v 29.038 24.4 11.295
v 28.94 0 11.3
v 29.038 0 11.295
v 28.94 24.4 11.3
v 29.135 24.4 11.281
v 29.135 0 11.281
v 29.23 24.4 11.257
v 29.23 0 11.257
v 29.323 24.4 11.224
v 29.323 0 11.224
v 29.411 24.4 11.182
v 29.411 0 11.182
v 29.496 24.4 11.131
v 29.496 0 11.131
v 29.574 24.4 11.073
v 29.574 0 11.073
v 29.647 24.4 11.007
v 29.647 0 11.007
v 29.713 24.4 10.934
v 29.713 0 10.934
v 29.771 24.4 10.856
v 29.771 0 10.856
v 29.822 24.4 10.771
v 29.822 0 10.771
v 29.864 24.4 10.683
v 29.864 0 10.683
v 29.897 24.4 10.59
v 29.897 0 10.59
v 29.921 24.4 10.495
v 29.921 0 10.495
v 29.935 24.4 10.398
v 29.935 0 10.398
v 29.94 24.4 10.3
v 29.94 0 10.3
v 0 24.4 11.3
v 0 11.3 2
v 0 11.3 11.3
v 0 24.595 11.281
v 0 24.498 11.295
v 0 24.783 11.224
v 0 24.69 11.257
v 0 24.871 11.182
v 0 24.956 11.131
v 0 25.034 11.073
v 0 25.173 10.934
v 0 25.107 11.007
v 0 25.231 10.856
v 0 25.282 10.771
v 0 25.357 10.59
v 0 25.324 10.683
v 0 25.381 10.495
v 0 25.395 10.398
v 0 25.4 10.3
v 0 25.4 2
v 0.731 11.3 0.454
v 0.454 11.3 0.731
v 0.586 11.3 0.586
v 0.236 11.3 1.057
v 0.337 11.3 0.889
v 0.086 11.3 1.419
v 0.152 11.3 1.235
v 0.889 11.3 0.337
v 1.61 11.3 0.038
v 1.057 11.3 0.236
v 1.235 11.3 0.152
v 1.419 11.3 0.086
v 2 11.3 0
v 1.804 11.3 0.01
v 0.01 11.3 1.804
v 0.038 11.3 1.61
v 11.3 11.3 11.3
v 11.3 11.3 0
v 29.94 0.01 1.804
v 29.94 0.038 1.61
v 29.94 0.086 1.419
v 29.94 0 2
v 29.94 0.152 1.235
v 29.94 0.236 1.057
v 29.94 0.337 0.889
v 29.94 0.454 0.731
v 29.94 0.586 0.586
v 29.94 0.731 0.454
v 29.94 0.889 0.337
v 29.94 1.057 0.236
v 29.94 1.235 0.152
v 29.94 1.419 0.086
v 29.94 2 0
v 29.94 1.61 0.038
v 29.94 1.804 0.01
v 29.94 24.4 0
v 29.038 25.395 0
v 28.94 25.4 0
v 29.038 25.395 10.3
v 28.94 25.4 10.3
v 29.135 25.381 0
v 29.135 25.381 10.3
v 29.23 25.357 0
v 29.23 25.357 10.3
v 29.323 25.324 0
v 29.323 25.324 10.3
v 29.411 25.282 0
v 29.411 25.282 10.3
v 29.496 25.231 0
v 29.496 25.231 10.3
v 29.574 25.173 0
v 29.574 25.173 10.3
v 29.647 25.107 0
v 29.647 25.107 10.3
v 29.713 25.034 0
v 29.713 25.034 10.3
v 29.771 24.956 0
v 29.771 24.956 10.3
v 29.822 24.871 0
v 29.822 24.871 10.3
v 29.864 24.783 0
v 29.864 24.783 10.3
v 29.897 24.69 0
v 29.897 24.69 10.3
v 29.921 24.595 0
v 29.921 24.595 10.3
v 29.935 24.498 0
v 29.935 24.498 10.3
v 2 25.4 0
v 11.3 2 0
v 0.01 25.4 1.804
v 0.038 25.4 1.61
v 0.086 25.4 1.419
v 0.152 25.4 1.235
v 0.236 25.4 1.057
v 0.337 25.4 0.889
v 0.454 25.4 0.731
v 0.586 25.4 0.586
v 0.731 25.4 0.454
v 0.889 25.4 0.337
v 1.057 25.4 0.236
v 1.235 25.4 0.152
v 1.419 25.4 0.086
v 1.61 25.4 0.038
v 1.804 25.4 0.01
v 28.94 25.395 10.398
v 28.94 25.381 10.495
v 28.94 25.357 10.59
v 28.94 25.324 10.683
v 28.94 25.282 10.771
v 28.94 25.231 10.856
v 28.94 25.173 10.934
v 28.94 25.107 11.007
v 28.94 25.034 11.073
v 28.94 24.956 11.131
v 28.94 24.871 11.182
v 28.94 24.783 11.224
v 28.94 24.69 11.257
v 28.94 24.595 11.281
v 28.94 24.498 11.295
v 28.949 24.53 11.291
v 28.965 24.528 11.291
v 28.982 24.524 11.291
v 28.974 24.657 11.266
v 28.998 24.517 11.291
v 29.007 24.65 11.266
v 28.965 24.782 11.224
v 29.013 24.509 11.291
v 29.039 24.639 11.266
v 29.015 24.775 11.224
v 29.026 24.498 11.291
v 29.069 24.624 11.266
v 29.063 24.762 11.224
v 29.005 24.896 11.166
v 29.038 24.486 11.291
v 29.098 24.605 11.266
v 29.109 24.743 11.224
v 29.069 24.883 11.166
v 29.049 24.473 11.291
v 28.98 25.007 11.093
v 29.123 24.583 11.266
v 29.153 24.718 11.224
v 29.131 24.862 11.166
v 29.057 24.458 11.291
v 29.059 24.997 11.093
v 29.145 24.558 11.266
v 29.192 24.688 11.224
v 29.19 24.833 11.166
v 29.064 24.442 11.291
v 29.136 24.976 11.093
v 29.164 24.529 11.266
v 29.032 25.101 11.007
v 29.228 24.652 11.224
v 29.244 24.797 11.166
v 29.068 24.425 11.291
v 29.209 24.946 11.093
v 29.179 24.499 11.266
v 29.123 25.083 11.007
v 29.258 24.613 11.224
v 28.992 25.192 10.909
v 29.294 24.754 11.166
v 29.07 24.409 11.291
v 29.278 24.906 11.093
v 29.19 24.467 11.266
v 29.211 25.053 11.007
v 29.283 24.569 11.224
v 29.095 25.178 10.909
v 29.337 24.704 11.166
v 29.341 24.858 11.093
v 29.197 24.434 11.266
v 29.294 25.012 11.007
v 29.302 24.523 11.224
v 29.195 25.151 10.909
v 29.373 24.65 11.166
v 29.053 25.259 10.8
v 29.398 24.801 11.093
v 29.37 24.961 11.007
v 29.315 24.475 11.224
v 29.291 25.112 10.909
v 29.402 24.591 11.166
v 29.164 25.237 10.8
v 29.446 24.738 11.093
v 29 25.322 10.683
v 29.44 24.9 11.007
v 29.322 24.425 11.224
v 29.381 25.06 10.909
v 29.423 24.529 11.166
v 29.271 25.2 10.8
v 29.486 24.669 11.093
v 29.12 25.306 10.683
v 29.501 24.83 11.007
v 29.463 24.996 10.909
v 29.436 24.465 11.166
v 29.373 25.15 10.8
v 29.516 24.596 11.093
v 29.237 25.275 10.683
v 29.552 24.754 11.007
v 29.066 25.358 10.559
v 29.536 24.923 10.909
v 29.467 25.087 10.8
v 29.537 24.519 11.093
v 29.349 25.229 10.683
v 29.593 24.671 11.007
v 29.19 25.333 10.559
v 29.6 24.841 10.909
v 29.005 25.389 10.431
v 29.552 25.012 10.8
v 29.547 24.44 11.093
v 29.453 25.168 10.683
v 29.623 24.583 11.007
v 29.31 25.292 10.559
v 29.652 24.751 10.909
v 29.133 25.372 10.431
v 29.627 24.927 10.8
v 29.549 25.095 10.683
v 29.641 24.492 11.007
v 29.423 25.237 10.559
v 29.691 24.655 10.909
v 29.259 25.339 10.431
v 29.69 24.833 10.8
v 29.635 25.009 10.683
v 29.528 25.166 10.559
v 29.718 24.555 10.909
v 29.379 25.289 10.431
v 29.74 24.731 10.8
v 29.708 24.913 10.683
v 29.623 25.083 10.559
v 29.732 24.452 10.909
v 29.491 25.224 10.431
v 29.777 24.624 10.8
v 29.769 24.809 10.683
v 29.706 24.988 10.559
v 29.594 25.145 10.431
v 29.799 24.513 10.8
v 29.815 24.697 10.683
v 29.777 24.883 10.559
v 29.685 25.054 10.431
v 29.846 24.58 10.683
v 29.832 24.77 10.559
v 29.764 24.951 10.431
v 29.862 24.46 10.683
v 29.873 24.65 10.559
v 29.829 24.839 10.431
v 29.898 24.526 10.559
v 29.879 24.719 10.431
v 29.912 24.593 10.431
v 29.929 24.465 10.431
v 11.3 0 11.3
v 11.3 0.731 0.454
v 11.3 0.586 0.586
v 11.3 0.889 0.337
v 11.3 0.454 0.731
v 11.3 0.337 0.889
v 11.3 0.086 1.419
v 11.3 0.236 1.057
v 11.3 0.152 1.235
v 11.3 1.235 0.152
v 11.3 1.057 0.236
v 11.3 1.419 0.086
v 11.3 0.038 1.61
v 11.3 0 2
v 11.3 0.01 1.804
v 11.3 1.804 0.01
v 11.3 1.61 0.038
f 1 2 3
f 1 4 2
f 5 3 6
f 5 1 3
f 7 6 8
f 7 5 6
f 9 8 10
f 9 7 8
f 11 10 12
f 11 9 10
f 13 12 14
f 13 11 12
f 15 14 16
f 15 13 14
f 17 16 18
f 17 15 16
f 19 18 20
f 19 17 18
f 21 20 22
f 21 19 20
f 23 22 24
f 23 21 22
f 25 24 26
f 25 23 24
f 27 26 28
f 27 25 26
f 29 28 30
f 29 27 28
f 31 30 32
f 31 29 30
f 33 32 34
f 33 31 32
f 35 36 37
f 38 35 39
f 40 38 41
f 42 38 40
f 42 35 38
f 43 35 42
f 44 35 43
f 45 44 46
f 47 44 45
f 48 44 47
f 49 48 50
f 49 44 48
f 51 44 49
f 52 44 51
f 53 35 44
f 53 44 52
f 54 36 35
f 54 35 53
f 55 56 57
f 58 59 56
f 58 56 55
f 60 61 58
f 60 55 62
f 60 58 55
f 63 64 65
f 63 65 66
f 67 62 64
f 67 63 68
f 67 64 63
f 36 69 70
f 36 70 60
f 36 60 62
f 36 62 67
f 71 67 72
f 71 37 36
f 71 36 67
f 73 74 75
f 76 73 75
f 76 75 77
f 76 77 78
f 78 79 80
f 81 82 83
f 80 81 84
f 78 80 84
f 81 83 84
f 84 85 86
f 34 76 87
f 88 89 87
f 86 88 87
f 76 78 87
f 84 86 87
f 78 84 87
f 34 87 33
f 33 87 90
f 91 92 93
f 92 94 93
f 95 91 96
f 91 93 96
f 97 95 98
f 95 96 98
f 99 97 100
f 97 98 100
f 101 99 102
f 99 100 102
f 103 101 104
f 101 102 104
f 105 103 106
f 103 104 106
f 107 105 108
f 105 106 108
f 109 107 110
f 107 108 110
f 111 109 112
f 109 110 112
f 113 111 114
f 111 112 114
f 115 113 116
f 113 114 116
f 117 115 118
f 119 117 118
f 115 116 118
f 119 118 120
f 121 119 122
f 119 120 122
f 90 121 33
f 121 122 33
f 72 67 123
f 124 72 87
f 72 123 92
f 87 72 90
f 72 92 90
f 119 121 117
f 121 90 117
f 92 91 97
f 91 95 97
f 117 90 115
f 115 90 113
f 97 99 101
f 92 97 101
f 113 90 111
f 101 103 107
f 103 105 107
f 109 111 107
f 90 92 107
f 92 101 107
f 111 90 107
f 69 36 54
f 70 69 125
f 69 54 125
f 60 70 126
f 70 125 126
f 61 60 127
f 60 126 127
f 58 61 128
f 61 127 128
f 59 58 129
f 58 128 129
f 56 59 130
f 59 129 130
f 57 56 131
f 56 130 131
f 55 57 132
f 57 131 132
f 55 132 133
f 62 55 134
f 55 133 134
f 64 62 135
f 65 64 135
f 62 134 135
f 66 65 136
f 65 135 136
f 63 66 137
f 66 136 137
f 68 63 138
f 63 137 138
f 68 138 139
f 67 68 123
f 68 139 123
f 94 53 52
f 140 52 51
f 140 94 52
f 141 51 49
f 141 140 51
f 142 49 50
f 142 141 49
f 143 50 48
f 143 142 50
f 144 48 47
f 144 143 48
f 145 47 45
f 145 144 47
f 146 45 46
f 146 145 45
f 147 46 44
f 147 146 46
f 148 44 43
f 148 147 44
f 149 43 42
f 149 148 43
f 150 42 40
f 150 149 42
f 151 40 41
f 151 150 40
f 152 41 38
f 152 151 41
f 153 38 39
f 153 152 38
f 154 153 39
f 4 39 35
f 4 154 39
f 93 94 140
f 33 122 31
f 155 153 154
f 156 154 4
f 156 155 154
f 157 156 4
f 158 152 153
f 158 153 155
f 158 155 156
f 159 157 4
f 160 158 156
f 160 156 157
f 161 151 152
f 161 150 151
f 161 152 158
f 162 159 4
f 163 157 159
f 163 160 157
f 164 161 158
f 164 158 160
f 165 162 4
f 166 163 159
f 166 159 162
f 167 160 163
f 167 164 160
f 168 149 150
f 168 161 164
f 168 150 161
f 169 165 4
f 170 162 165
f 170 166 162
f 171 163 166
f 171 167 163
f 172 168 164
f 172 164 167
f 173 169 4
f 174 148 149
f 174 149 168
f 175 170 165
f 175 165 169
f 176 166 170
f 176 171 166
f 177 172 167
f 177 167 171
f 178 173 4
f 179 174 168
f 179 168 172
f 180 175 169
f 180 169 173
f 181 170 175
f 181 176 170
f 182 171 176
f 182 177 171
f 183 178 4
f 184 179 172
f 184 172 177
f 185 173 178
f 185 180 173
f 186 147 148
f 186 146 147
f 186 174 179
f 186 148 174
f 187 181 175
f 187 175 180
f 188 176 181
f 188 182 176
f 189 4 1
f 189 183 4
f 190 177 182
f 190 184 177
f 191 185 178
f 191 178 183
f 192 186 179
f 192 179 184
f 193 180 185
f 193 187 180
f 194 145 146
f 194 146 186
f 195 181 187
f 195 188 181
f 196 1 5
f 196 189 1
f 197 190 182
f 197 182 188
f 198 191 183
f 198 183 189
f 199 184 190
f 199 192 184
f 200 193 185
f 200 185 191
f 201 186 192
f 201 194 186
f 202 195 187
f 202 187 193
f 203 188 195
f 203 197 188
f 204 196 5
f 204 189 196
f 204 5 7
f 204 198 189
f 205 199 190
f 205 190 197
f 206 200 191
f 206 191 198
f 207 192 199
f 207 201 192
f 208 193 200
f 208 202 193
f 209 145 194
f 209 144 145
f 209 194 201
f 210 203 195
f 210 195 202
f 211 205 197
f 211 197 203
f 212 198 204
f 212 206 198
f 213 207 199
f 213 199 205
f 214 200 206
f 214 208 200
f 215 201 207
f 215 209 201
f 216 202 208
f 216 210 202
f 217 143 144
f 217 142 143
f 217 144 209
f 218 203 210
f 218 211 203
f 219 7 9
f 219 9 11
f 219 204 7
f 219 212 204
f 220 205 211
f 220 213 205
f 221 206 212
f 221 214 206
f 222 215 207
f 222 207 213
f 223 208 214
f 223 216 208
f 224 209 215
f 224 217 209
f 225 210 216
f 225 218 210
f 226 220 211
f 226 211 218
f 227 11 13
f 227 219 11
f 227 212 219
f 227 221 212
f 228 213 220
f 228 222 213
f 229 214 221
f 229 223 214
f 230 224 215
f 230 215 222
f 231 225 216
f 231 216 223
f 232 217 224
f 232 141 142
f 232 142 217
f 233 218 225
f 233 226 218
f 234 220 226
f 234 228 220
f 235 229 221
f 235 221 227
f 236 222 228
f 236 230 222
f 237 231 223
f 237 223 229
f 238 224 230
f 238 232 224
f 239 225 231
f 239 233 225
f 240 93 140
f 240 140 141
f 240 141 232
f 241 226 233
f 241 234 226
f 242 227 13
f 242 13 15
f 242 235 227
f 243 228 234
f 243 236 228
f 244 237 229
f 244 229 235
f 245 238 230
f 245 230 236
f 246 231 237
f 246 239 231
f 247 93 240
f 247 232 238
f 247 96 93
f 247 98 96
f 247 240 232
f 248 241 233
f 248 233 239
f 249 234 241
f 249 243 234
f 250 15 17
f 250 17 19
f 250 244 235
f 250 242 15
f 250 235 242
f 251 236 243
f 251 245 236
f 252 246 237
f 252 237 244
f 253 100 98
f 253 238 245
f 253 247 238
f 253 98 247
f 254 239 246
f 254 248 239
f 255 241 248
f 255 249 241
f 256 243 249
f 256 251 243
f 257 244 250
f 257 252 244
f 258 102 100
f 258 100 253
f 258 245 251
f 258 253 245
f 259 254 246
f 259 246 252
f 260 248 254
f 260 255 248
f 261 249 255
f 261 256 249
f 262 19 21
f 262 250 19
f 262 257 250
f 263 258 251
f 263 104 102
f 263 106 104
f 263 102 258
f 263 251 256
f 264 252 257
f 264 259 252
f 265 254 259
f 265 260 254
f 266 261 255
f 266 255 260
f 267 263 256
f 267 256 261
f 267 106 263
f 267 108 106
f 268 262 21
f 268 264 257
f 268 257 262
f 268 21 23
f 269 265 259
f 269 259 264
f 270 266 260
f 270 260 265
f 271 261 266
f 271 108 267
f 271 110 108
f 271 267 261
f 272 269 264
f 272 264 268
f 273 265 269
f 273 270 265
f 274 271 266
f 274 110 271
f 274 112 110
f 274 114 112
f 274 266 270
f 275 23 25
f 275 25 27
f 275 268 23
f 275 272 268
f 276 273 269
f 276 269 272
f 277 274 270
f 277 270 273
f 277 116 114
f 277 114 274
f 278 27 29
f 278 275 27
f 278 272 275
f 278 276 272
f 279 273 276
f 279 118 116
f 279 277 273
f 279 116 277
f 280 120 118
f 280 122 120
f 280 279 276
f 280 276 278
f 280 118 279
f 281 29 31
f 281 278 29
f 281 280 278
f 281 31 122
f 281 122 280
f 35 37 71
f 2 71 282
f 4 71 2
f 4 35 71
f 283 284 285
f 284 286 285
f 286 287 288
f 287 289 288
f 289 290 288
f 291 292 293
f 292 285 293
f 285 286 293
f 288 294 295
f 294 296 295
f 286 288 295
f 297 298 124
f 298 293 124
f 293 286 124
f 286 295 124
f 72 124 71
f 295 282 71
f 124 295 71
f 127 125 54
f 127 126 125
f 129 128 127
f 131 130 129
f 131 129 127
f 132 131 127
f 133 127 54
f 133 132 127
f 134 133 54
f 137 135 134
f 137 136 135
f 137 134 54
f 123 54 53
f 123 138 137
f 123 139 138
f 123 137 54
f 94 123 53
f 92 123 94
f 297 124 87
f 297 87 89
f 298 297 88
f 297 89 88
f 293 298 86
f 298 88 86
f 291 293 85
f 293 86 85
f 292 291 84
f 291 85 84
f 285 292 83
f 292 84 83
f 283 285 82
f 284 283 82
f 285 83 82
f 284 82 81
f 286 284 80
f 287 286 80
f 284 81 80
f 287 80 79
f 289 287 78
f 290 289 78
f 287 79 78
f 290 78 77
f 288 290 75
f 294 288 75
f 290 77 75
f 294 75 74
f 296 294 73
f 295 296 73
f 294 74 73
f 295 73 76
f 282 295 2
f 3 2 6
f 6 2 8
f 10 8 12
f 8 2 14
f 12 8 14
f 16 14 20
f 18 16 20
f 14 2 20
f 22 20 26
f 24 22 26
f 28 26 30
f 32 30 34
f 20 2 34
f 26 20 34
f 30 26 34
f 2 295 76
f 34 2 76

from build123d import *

# Parameters (mm, degrees)
F0_W     = 29.94
F0_H     = 25.4
F1_DEPTH = 11.3
F2_W     = 11.3
F2_H     = 11.3
F3_DEPTH = 25
F4_R     = 2
F5_R     = 1


with BuildPart() as f1:
    # F0 (on Top) → F1 (new body)
    with BuildSketch(Plane.XY):
        with Locations((14.97, 12.7)):
            Rectangle(F0_W, F0_H)
    extrude(amount=F1_DEPTH)

    # F2 (on face) → F3 (cut)
    with BuildSketch(Plane.XY.offset(11.3)):
        with Locations((5.65, 5.65)):
            Rectangle(F2_W, F2_H)
    extrude(amount=-F3_DEPTH, mode=Mode.SUBTRACT)

    # F4
    f4_edges = [f1.edges().sort_by_distance(p)[0] for p in [
        (20.62, 0, 0),
        (0, 18.35, 0),
    ]]
    fillet(f4_edges, radius=F4_R)

    # F5
    f5_edges = [f1.edges().sort_by_distance(p)[0] for p in [
        (29.94, 25.4, 5.65),
        (14.97, 25.4, 11.3),
        (29.94, 12.7, 11.3),
    ]]
    fillet(f5_edges, radius=F5_R)


solid = f1.part
